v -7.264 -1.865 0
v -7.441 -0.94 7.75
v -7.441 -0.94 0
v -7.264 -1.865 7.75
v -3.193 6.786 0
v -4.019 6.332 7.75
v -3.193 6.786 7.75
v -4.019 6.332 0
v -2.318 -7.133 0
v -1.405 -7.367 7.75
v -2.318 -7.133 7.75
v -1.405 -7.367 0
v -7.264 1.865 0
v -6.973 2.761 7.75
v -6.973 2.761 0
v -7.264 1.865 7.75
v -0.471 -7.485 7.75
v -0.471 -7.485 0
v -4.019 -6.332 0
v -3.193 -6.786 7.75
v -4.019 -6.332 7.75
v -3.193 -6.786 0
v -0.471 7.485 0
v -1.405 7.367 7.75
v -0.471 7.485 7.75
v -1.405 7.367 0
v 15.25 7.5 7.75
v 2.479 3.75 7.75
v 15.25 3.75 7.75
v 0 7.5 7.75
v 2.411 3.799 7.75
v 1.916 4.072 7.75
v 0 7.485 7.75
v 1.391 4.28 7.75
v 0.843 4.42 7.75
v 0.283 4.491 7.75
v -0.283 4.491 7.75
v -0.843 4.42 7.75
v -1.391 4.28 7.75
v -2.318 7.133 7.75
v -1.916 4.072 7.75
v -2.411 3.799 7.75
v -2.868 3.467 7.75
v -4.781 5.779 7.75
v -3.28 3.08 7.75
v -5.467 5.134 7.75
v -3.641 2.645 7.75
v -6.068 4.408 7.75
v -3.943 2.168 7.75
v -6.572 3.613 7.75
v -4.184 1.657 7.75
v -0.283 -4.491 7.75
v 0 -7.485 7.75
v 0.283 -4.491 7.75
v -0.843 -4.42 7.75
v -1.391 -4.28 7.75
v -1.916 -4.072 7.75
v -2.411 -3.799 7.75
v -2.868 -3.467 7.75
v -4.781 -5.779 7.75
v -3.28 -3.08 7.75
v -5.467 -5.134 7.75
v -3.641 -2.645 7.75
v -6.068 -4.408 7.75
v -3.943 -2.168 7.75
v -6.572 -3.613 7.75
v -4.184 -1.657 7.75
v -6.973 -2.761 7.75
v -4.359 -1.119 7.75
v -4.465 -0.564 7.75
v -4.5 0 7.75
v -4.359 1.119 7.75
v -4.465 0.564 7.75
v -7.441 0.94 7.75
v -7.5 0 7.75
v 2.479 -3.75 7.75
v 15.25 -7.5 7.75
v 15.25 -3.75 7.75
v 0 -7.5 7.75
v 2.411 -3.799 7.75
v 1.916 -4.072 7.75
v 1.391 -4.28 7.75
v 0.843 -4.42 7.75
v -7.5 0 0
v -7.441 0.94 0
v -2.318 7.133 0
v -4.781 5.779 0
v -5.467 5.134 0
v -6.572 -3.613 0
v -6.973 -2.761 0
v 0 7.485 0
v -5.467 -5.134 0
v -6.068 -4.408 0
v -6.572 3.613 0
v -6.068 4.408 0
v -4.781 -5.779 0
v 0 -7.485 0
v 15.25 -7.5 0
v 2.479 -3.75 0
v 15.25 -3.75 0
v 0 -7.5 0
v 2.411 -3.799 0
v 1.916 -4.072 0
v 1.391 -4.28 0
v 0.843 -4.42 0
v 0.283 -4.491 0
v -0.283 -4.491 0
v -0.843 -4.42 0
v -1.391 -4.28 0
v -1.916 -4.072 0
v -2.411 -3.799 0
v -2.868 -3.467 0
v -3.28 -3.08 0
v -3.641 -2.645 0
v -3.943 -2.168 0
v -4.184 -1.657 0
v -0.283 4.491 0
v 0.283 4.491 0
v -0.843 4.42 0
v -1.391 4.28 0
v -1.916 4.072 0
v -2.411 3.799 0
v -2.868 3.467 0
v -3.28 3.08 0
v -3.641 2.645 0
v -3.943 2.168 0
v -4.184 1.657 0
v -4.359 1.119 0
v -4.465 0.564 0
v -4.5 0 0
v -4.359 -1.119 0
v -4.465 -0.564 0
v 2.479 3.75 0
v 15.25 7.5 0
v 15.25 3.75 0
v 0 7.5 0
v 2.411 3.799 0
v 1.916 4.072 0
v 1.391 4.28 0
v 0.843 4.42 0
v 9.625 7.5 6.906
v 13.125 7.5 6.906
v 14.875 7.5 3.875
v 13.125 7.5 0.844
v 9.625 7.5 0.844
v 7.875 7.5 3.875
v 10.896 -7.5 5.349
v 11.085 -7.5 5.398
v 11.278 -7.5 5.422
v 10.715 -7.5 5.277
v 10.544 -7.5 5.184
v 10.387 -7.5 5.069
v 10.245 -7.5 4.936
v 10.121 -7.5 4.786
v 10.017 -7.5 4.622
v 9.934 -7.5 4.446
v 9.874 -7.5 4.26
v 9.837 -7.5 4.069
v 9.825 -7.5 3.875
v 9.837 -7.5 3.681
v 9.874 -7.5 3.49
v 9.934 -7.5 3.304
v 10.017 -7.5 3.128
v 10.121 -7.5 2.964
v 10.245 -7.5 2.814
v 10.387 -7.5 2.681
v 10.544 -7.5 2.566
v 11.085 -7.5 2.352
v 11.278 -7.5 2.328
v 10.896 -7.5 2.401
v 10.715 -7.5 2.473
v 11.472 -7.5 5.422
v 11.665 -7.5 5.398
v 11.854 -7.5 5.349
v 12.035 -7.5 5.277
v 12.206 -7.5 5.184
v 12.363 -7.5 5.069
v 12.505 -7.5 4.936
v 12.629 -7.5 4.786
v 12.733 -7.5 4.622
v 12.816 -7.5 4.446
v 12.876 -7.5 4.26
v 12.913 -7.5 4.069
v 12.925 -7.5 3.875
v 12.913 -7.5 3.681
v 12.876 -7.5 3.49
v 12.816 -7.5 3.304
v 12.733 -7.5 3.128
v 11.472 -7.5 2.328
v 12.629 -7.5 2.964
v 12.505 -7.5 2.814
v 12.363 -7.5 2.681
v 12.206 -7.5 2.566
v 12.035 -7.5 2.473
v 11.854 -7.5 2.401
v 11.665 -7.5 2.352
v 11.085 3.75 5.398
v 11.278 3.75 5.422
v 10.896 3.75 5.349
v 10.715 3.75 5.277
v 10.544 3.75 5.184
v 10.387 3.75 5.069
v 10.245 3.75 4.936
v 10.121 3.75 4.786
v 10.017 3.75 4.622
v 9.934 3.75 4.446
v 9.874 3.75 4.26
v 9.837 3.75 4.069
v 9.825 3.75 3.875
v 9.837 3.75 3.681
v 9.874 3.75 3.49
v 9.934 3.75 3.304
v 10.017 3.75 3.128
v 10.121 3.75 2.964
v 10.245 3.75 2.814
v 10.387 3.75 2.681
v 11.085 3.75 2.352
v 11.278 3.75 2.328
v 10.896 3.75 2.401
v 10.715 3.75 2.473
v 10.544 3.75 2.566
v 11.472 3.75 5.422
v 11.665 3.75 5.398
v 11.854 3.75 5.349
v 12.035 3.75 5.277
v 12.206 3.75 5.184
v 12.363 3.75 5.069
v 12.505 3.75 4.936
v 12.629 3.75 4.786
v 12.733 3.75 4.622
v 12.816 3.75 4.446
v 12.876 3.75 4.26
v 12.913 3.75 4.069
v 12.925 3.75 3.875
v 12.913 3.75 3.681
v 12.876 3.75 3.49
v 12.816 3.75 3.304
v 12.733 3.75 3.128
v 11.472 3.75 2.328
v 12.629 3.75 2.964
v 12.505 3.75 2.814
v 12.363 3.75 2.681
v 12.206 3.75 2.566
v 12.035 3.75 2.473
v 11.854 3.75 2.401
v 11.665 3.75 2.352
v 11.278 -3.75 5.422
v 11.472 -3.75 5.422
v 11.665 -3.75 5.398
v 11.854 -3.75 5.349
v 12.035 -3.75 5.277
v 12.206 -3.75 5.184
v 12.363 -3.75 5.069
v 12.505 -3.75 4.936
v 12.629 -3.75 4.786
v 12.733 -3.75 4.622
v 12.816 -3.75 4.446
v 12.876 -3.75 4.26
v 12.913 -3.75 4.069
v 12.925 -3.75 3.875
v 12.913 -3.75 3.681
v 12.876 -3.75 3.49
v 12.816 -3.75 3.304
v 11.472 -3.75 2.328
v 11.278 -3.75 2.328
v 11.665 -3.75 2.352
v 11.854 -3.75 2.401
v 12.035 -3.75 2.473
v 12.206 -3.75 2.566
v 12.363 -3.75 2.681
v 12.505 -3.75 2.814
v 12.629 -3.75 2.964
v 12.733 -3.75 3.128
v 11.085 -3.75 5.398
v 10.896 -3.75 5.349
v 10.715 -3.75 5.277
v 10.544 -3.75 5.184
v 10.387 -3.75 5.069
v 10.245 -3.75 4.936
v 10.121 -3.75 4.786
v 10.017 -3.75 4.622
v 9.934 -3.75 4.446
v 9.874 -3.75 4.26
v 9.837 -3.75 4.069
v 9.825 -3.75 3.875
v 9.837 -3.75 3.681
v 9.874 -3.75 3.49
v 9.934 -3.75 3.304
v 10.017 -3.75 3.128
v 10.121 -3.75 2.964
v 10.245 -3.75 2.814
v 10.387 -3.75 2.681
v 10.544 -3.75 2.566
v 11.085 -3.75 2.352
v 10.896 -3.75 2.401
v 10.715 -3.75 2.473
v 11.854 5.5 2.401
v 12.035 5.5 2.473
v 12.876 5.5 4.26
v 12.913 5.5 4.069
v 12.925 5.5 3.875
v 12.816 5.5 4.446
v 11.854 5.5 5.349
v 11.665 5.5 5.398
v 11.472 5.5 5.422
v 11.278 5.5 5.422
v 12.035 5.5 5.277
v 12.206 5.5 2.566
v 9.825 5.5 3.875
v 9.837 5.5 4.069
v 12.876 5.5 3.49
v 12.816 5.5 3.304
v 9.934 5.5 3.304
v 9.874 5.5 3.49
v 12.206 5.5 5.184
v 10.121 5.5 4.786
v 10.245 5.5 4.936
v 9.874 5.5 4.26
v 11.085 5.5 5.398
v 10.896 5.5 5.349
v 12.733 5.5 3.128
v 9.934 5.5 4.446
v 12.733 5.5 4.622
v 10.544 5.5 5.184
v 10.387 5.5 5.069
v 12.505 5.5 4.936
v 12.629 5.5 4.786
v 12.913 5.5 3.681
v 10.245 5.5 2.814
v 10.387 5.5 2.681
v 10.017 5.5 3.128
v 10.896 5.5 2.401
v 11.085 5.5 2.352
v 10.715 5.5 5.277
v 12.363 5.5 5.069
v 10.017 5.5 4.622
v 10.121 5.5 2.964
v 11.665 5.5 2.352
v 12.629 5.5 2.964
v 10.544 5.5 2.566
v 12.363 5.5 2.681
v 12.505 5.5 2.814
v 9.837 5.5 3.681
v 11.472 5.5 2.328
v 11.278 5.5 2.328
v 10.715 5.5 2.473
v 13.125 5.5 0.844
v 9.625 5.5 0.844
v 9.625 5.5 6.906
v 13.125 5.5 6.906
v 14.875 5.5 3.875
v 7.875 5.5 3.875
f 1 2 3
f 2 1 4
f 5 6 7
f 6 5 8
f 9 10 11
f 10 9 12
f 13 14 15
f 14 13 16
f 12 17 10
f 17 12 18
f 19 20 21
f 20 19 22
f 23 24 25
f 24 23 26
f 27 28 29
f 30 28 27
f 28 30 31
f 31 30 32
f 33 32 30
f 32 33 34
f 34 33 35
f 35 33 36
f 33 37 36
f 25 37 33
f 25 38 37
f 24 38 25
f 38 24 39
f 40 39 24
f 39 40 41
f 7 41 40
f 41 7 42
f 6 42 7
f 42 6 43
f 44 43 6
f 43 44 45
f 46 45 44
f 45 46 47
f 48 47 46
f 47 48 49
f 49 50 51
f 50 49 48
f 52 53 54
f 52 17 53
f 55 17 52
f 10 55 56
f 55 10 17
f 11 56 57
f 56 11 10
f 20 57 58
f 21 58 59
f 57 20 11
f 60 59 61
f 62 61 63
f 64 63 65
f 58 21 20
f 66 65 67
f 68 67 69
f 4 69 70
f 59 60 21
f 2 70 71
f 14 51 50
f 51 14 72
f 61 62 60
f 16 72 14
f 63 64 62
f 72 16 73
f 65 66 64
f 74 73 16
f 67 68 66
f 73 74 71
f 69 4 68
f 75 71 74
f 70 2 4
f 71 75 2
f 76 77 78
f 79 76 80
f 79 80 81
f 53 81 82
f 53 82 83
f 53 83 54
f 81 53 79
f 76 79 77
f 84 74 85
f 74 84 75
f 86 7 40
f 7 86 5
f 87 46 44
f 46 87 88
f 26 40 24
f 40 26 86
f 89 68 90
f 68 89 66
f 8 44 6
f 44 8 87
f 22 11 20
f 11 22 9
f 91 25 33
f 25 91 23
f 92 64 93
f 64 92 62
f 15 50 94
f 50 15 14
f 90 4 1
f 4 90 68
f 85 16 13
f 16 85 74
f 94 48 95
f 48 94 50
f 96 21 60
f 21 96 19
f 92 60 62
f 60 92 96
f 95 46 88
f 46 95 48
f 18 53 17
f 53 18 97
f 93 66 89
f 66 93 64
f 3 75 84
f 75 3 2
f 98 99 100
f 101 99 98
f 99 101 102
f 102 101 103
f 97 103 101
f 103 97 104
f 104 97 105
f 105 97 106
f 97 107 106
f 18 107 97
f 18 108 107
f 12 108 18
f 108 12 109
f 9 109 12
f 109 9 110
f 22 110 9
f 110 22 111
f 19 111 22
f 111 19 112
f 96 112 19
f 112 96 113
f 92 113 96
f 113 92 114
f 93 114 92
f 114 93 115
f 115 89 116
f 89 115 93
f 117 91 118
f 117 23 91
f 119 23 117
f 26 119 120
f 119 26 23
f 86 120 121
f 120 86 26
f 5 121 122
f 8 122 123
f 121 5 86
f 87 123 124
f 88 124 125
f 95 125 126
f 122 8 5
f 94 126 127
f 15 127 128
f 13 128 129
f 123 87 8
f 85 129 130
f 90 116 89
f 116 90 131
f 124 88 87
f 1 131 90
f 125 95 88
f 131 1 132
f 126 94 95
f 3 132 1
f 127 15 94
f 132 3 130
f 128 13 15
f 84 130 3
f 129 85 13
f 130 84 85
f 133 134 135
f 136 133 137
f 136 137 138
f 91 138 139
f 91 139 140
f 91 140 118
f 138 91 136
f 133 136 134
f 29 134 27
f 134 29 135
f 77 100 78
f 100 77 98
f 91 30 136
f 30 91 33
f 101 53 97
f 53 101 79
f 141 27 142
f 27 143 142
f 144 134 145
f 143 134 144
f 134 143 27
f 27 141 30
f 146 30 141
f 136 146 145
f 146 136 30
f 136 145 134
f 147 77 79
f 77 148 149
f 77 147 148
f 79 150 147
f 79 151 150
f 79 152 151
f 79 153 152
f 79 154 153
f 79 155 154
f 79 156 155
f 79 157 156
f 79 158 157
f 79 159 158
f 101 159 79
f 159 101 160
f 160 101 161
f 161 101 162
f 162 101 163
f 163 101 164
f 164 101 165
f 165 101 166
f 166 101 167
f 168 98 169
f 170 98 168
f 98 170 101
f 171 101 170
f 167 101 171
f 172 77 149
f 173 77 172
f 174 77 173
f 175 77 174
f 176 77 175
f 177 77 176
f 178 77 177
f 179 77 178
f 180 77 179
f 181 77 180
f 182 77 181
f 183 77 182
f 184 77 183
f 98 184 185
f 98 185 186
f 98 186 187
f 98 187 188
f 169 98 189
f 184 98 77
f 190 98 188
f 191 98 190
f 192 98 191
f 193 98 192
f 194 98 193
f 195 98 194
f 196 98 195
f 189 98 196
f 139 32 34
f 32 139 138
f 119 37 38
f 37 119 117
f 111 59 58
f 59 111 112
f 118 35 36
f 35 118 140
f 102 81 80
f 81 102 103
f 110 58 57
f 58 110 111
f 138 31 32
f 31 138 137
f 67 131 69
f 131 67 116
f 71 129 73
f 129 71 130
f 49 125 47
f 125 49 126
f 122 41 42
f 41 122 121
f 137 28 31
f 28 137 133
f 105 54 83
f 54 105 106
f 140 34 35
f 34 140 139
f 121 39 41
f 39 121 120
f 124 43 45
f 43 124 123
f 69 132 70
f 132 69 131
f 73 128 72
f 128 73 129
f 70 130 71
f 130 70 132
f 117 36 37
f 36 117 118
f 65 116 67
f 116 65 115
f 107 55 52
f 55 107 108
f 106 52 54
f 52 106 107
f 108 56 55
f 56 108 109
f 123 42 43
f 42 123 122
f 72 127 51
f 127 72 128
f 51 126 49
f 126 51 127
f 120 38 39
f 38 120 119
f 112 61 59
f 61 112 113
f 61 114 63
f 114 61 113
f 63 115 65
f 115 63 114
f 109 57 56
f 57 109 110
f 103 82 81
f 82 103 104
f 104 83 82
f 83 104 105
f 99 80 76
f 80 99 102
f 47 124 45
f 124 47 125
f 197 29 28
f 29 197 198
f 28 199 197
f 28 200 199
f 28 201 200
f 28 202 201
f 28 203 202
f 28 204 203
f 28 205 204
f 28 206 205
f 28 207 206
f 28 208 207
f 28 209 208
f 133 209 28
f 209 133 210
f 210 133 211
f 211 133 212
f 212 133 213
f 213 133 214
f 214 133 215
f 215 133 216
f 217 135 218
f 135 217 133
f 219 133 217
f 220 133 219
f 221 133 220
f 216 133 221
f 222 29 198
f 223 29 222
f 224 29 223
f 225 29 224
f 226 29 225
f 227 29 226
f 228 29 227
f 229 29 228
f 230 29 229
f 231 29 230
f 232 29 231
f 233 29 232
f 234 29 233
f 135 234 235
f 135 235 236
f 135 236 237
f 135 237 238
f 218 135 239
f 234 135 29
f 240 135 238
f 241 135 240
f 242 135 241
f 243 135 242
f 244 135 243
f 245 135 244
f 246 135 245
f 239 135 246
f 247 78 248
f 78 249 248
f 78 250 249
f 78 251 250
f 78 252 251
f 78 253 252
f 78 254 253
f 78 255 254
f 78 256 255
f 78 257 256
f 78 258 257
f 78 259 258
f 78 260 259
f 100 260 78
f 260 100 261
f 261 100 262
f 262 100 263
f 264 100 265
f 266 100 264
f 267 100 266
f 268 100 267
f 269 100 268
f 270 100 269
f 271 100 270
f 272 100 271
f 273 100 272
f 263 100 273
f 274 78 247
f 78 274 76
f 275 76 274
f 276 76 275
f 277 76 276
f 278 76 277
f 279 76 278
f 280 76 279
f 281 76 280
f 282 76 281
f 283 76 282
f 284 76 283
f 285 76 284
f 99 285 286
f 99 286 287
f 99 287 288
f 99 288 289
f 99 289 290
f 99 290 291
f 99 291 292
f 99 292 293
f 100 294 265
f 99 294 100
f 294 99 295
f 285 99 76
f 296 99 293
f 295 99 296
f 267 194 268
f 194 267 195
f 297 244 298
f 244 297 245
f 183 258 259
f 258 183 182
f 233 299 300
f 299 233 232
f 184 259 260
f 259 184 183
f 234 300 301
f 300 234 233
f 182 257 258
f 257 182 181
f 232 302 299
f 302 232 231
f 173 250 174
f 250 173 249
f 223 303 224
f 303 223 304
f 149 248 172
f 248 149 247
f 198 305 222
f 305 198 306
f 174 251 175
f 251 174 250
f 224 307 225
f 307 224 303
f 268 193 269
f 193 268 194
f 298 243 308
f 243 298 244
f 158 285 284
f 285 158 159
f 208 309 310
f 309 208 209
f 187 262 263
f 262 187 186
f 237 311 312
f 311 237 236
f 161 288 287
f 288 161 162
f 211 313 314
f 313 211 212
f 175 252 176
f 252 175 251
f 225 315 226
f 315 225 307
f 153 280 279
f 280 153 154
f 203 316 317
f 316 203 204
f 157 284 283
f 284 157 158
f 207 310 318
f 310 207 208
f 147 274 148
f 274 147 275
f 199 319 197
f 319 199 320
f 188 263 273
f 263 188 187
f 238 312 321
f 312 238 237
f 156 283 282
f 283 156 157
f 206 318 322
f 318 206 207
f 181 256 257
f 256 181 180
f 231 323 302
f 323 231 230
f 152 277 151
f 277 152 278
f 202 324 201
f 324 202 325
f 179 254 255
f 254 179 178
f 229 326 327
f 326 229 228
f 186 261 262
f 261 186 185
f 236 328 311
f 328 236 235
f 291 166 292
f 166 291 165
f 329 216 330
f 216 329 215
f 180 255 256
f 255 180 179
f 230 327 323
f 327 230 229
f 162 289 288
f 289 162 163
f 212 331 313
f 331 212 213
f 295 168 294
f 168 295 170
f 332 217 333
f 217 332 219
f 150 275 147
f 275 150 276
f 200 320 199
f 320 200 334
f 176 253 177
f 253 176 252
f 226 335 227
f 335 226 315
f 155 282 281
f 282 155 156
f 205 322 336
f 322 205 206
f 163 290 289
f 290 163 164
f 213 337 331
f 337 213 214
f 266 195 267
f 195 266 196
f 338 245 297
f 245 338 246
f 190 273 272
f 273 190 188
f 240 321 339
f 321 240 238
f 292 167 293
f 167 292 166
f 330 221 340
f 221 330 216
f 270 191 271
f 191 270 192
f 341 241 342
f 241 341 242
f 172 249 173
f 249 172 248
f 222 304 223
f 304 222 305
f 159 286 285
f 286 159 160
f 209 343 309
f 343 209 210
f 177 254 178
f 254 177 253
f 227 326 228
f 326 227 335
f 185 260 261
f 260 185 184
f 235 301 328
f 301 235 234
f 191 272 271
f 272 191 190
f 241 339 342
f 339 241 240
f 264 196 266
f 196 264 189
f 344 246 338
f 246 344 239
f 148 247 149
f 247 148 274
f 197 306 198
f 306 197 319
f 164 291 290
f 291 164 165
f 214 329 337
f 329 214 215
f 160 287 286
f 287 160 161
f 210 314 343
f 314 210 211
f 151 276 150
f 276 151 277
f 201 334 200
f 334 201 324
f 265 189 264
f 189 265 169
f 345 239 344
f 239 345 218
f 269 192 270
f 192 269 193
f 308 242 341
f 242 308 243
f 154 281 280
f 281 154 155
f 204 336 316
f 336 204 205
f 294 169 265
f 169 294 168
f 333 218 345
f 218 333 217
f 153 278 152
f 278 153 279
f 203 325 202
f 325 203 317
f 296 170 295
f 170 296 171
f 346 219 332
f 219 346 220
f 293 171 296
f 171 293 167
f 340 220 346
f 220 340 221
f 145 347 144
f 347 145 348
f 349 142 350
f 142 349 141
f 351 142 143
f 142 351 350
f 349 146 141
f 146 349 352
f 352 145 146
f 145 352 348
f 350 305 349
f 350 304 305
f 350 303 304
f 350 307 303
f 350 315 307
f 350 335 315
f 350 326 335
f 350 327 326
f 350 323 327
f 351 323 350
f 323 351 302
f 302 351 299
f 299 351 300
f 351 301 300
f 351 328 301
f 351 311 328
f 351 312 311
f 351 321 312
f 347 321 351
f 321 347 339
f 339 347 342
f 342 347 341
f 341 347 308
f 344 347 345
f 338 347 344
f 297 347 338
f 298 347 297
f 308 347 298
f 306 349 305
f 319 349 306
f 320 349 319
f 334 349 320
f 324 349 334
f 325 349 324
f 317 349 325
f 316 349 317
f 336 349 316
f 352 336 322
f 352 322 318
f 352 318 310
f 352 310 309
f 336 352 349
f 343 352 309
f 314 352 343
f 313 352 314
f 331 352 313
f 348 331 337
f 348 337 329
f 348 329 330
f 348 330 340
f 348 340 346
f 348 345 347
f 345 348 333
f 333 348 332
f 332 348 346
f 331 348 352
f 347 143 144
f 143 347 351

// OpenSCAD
$fn=50;
//Radius of tube to clamp to
R=4.5;
//Width of ring
w=3;
//Bolt screw radius
screwR=1.55;
//Bolt/nut wrench size
nutR=3.5;
//Bolt/nut trap size
nutH=2;
//Space of clamp
space=7.5;
//
hfactor = 2.5;


module clamp(R,w,screwR,nutR,nutH,space){
    h=screwR*hfactor*2;
    difference(){
        union(){
            cylinder(r=R+w,h = h);
            translate([0,-(R+w),0]) cube([(R+w+h),(R+w)*2,h]);
        }
        cylinder(r=R,h=h);
        translate([0,-space/2,0]) cube([(R+w+h),space,h]);
        
        
        translate([(R+w+screwR*hfactor),(R+w),screwR*hfactor]) rotate([90,0,0]) cylinder(r=screwR,h=(R+w)*2);
        translate([(R+w+screwR*
        hfactor),(R+w),screwR*hfactor]) rotate([90,0,0]) cylinder(r=nutR,h=nutH, $fn=6);
        
    }

}


clamp(R,w,screwR,nutR,nutH,space);
